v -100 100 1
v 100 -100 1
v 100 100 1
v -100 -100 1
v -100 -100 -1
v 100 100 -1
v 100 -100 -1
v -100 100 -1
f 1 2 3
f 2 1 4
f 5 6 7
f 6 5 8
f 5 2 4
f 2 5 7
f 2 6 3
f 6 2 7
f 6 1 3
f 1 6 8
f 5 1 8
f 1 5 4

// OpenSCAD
// Parameters
sheet_length = 200; //[100:400:1]
sheet_width  = 200; //[100:400:1]
sheet_thickness = 2; //[1:6:0.5]

// Robust minimum thickness to avoid degenerate/blank renders
min_t = 0.5;
t = max(sheet_thickness, min_t);

// Geometry (one connected solid)
color([0.85, 0.85, 0.8])
cube([sheet_length, sheet_width, t], center=true);
